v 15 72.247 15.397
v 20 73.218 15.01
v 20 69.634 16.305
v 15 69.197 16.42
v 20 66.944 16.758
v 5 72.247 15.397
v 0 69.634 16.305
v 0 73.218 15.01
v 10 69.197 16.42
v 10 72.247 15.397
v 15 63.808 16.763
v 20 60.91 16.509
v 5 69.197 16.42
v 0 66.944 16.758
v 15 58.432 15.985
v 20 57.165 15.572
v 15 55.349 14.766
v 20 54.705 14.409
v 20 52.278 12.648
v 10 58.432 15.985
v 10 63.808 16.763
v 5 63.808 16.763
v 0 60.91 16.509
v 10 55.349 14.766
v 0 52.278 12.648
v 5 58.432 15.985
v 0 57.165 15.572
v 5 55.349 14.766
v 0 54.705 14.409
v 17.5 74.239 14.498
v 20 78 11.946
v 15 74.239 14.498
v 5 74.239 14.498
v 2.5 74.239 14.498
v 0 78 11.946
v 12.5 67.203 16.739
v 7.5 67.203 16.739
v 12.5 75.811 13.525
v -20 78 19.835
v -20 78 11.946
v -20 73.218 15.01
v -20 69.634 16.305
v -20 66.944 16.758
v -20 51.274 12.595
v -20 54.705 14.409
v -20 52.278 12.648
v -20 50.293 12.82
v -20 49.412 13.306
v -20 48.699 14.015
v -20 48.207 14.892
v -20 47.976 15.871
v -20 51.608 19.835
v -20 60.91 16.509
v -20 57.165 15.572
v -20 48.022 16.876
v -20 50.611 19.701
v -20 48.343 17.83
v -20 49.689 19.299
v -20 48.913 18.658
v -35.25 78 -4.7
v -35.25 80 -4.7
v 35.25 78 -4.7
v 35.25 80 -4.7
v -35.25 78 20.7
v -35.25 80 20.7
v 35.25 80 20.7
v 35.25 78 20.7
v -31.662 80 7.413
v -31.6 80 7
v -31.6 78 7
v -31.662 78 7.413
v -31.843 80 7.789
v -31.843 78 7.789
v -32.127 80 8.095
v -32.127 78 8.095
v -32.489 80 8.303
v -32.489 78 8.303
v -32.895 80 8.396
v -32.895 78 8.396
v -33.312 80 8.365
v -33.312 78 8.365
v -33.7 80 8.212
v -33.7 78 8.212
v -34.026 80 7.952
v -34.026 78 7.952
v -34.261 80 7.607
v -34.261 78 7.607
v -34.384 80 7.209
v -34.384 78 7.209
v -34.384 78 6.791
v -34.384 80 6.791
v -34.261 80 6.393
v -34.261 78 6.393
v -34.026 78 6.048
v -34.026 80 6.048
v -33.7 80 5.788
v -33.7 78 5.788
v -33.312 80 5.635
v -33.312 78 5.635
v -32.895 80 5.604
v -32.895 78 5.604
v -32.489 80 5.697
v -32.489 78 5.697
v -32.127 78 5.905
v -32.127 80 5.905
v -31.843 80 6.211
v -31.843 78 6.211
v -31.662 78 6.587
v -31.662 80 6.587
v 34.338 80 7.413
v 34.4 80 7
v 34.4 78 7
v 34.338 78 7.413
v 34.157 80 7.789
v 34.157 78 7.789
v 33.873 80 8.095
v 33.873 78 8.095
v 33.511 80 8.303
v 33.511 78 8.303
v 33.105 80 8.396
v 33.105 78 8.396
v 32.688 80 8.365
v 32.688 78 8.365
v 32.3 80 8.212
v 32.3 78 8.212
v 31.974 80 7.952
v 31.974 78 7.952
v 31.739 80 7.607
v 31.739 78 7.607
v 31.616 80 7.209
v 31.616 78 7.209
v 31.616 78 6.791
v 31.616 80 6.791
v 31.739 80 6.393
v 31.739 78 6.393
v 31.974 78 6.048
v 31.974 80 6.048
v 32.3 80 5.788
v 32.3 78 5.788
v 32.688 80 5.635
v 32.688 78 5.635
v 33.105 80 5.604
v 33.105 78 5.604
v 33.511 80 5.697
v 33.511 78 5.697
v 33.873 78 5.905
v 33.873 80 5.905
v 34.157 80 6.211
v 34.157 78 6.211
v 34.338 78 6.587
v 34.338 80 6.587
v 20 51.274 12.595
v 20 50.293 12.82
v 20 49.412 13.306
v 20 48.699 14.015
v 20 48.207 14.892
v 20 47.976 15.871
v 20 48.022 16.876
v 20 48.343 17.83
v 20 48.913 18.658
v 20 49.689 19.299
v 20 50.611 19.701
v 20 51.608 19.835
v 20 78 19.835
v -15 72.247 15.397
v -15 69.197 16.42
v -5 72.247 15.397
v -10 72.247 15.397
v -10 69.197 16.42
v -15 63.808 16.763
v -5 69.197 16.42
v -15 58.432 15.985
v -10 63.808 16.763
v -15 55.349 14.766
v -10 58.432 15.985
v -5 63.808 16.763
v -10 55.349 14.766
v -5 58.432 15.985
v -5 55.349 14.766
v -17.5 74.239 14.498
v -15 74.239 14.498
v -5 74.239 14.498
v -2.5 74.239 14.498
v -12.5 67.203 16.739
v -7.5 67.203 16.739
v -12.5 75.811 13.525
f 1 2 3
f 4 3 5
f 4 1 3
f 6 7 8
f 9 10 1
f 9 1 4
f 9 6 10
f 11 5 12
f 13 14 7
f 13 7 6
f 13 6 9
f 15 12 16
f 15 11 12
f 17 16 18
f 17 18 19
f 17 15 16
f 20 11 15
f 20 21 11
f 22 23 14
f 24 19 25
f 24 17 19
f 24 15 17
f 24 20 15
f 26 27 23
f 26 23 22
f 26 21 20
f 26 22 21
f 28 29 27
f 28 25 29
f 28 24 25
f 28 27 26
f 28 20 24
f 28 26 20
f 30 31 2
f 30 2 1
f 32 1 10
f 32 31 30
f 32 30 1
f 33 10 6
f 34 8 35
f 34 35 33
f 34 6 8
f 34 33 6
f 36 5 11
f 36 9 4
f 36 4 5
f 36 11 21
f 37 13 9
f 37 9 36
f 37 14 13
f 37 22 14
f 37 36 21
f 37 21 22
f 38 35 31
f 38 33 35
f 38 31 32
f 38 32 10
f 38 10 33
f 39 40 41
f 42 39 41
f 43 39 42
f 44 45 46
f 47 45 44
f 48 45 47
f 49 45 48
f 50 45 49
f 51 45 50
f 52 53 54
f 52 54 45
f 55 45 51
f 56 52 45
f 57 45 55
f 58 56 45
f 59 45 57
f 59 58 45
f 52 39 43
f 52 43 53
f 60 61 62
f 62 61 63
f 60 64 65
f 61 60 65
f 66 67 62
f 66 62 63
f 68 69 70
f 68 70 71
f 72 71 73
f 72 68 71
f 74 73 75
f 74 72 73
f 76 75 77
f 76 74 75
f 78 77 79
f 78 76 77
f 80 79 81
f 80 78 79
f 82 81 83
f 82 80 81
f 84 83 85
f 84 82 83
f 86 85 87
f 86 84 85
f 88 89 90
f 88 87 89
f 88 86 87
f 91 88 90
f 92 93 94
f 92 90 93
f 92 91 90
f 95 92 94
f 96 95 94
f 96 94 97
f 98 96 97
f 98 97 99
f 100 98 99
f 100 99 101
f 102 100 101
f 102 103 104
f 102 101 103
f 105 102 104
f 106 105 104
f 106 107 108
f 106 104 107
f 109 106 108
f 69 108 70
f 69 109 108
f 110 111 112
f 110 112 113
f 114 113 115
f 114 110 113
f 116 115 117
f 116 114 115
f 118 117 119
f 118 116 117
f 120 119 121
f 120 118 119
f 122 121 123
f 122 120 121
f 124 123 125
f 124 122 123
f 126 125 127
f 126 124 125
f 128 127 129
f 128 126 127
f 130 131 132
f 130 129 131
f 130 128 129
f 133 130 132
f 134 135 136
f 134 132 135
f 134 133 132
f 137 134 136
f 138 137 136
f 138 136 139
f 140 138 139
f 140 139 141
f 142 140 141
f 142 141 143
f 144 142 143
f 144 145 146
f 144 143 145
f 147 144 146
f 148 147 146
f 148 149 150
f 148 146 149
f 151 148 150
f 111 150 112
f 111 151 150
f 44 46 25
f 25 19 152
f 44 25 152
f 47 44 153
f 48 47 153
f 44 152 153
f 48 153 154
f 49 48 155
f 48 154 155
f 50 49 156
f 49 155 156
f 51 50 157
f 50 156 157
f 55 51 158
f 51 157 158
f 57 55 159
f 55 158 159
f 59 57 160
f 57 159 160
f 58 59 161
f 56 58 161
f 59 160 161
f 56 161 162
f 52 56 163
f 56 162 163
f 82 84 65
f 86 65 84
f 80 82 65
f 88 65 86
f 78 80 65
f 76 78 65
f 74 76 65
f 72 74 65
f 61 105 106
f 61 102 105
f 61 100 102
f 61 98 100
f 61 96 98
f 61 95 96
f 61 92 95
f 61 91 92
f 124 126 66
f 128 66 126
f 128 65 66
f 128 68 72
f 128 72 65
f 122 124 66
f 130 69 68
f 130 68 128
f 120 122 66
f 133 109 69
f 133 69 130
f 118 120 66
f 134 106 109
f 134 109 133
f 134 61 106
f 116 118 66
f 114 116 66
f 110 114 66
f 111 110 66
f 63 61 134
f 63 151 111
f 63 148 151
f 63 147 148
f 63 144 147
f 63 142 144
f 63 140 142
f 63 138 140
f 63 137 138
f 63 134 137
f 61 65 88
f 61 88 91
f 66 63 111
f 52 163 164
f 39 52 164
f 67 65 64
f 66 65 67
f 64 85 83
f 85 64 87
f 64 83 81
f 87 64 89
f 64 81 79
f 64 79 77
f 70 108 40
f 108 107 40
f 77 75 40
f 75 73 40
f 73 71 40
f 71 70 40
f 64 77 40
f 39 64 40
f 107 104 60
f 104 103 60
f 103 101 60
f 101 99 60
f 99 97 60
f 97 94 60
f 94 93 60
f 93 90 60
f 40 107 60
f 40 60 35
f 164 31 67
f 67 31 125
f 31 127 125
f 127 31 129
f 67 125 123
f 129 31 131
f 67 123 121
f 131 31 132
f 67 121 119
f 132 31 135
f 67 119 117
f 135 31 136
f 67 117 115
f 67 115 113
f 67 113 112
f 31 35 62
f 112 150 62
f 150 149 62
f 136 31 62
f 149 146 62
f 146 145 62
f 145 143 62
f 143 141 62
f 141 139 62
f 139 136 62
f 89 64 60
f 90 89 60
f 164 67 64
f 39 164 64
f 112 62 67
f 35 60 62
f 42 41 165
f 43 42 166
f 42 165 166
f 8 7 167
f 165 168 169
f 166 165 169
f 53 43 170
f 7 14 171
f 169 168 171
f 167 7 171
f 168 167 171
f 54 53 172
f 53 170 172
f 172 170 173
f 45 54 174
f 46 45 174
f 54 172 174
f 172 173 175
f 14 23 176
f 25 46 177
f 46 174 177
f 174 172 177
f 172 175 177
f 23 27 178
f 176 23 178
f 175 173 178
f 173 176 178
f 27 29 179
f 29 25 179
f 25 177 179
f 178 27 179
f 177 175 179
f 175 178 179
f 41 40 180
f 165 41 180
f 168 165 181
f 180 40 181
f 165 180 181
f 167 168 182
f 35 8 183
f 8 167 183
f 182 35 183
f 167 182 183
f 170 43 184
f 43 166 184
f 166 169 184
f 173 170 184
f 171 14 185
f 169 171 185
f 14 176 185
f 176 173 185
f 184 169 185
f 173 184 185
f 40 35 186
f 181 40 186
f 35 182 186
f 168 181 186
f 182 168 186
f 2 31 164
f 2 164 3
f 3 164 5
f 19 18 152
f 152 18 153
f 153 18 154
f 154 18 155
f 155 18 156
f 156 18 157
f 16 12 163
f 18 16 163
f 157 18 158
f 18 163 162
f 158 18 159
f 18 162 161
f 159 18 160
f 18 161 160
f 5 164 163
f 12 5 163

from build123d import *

# Parameters (mm, degrees)
PAD002_DEPTH      = 20
CYLINDER017_R     = 1.4
CYLINDER017_DEPTH = 10
ARRAY014_X_COUNT  = 2
ARRAY014_X_PITCH  = 66
BOX031_W          = 70.5
BOX031_H          = 2
BOX031_DEPTH      = 25.4


with BuildPart() as body003:
    # Sketch003 → Pad002 (new body, symmetric)
    with BuildSketch(Plane.YZ):
        with BuildLine():
            Line((78.762321, 19.834602), (78.762321, 11.356619))
            add(Edge.make_bspline(
                [(78.762321, 11.356619), (74.77858, 14.475335), (71.96254, 15.481066), (69.448204, 16.486797), (65.425285, 17.090239), (56.273132, 16.18508), (52.278152, 12.648025)],
                knots=[0, 0, 0, 0, 0.25, 0.5, 0.75, 1, 1, 1, 1], degree=3))
            ThreePointArc((52.278152, 12.648025), (47.975835, 15.871458), (51.608182, 19.834602))
            Line((51.608182, 19.834602), (78.762321, 19.834602))
        make_face()
    extrude(amount=PAD002_DEPTH, both=True)


with BuildPart() as battery_cover_screw_hole_array:
    # Cylinder017 → Cylinder017 (new body)
    with BuildSketch(Plane(origin=(-33, 86, 7), x_dir=(1, 0, 0), z_dir=(0, -1, 0))):
        Circle(CYLINDER017_R)
    extrude(amount=CYLINDER017_DEPTH)

    # Array014 X: battery cover screw hole array ×2


with BuildPart() as battery_cover_screw_hole_array_1:
    add(battery_cover_screw_hole_array.part)
    with Locations(*[(i * ARRAY014_X_PITCH, 0, 0) for i in range(1, ARRAY014_X_COUNT)]):
        add(battery_cover_screw_hole_array.part)


with BuildPart() as battery_cover_plate_fusion:
    # Box031 → Box031 (new body)
    with BuildSketch(Plane(origin=(-35.25, 78, -4.7), x_dir=(1, 0, 0), z_dir=(0, 0, 1))):
        with Locations((35.25, 1)):
            Rectangle(BOX031_W, BOX031_H)
    extrude(amount=BOX031_DEPTH)

    # Cut002003008: cut battery cover screw hole array
    add(battery_cover_screw_hole_array_1.part, mode=Mode.SUBTRACT)

    # Fusion005004008: union Body003
    add(body003.part)


solid = battery_cover_plate_fusion.part
